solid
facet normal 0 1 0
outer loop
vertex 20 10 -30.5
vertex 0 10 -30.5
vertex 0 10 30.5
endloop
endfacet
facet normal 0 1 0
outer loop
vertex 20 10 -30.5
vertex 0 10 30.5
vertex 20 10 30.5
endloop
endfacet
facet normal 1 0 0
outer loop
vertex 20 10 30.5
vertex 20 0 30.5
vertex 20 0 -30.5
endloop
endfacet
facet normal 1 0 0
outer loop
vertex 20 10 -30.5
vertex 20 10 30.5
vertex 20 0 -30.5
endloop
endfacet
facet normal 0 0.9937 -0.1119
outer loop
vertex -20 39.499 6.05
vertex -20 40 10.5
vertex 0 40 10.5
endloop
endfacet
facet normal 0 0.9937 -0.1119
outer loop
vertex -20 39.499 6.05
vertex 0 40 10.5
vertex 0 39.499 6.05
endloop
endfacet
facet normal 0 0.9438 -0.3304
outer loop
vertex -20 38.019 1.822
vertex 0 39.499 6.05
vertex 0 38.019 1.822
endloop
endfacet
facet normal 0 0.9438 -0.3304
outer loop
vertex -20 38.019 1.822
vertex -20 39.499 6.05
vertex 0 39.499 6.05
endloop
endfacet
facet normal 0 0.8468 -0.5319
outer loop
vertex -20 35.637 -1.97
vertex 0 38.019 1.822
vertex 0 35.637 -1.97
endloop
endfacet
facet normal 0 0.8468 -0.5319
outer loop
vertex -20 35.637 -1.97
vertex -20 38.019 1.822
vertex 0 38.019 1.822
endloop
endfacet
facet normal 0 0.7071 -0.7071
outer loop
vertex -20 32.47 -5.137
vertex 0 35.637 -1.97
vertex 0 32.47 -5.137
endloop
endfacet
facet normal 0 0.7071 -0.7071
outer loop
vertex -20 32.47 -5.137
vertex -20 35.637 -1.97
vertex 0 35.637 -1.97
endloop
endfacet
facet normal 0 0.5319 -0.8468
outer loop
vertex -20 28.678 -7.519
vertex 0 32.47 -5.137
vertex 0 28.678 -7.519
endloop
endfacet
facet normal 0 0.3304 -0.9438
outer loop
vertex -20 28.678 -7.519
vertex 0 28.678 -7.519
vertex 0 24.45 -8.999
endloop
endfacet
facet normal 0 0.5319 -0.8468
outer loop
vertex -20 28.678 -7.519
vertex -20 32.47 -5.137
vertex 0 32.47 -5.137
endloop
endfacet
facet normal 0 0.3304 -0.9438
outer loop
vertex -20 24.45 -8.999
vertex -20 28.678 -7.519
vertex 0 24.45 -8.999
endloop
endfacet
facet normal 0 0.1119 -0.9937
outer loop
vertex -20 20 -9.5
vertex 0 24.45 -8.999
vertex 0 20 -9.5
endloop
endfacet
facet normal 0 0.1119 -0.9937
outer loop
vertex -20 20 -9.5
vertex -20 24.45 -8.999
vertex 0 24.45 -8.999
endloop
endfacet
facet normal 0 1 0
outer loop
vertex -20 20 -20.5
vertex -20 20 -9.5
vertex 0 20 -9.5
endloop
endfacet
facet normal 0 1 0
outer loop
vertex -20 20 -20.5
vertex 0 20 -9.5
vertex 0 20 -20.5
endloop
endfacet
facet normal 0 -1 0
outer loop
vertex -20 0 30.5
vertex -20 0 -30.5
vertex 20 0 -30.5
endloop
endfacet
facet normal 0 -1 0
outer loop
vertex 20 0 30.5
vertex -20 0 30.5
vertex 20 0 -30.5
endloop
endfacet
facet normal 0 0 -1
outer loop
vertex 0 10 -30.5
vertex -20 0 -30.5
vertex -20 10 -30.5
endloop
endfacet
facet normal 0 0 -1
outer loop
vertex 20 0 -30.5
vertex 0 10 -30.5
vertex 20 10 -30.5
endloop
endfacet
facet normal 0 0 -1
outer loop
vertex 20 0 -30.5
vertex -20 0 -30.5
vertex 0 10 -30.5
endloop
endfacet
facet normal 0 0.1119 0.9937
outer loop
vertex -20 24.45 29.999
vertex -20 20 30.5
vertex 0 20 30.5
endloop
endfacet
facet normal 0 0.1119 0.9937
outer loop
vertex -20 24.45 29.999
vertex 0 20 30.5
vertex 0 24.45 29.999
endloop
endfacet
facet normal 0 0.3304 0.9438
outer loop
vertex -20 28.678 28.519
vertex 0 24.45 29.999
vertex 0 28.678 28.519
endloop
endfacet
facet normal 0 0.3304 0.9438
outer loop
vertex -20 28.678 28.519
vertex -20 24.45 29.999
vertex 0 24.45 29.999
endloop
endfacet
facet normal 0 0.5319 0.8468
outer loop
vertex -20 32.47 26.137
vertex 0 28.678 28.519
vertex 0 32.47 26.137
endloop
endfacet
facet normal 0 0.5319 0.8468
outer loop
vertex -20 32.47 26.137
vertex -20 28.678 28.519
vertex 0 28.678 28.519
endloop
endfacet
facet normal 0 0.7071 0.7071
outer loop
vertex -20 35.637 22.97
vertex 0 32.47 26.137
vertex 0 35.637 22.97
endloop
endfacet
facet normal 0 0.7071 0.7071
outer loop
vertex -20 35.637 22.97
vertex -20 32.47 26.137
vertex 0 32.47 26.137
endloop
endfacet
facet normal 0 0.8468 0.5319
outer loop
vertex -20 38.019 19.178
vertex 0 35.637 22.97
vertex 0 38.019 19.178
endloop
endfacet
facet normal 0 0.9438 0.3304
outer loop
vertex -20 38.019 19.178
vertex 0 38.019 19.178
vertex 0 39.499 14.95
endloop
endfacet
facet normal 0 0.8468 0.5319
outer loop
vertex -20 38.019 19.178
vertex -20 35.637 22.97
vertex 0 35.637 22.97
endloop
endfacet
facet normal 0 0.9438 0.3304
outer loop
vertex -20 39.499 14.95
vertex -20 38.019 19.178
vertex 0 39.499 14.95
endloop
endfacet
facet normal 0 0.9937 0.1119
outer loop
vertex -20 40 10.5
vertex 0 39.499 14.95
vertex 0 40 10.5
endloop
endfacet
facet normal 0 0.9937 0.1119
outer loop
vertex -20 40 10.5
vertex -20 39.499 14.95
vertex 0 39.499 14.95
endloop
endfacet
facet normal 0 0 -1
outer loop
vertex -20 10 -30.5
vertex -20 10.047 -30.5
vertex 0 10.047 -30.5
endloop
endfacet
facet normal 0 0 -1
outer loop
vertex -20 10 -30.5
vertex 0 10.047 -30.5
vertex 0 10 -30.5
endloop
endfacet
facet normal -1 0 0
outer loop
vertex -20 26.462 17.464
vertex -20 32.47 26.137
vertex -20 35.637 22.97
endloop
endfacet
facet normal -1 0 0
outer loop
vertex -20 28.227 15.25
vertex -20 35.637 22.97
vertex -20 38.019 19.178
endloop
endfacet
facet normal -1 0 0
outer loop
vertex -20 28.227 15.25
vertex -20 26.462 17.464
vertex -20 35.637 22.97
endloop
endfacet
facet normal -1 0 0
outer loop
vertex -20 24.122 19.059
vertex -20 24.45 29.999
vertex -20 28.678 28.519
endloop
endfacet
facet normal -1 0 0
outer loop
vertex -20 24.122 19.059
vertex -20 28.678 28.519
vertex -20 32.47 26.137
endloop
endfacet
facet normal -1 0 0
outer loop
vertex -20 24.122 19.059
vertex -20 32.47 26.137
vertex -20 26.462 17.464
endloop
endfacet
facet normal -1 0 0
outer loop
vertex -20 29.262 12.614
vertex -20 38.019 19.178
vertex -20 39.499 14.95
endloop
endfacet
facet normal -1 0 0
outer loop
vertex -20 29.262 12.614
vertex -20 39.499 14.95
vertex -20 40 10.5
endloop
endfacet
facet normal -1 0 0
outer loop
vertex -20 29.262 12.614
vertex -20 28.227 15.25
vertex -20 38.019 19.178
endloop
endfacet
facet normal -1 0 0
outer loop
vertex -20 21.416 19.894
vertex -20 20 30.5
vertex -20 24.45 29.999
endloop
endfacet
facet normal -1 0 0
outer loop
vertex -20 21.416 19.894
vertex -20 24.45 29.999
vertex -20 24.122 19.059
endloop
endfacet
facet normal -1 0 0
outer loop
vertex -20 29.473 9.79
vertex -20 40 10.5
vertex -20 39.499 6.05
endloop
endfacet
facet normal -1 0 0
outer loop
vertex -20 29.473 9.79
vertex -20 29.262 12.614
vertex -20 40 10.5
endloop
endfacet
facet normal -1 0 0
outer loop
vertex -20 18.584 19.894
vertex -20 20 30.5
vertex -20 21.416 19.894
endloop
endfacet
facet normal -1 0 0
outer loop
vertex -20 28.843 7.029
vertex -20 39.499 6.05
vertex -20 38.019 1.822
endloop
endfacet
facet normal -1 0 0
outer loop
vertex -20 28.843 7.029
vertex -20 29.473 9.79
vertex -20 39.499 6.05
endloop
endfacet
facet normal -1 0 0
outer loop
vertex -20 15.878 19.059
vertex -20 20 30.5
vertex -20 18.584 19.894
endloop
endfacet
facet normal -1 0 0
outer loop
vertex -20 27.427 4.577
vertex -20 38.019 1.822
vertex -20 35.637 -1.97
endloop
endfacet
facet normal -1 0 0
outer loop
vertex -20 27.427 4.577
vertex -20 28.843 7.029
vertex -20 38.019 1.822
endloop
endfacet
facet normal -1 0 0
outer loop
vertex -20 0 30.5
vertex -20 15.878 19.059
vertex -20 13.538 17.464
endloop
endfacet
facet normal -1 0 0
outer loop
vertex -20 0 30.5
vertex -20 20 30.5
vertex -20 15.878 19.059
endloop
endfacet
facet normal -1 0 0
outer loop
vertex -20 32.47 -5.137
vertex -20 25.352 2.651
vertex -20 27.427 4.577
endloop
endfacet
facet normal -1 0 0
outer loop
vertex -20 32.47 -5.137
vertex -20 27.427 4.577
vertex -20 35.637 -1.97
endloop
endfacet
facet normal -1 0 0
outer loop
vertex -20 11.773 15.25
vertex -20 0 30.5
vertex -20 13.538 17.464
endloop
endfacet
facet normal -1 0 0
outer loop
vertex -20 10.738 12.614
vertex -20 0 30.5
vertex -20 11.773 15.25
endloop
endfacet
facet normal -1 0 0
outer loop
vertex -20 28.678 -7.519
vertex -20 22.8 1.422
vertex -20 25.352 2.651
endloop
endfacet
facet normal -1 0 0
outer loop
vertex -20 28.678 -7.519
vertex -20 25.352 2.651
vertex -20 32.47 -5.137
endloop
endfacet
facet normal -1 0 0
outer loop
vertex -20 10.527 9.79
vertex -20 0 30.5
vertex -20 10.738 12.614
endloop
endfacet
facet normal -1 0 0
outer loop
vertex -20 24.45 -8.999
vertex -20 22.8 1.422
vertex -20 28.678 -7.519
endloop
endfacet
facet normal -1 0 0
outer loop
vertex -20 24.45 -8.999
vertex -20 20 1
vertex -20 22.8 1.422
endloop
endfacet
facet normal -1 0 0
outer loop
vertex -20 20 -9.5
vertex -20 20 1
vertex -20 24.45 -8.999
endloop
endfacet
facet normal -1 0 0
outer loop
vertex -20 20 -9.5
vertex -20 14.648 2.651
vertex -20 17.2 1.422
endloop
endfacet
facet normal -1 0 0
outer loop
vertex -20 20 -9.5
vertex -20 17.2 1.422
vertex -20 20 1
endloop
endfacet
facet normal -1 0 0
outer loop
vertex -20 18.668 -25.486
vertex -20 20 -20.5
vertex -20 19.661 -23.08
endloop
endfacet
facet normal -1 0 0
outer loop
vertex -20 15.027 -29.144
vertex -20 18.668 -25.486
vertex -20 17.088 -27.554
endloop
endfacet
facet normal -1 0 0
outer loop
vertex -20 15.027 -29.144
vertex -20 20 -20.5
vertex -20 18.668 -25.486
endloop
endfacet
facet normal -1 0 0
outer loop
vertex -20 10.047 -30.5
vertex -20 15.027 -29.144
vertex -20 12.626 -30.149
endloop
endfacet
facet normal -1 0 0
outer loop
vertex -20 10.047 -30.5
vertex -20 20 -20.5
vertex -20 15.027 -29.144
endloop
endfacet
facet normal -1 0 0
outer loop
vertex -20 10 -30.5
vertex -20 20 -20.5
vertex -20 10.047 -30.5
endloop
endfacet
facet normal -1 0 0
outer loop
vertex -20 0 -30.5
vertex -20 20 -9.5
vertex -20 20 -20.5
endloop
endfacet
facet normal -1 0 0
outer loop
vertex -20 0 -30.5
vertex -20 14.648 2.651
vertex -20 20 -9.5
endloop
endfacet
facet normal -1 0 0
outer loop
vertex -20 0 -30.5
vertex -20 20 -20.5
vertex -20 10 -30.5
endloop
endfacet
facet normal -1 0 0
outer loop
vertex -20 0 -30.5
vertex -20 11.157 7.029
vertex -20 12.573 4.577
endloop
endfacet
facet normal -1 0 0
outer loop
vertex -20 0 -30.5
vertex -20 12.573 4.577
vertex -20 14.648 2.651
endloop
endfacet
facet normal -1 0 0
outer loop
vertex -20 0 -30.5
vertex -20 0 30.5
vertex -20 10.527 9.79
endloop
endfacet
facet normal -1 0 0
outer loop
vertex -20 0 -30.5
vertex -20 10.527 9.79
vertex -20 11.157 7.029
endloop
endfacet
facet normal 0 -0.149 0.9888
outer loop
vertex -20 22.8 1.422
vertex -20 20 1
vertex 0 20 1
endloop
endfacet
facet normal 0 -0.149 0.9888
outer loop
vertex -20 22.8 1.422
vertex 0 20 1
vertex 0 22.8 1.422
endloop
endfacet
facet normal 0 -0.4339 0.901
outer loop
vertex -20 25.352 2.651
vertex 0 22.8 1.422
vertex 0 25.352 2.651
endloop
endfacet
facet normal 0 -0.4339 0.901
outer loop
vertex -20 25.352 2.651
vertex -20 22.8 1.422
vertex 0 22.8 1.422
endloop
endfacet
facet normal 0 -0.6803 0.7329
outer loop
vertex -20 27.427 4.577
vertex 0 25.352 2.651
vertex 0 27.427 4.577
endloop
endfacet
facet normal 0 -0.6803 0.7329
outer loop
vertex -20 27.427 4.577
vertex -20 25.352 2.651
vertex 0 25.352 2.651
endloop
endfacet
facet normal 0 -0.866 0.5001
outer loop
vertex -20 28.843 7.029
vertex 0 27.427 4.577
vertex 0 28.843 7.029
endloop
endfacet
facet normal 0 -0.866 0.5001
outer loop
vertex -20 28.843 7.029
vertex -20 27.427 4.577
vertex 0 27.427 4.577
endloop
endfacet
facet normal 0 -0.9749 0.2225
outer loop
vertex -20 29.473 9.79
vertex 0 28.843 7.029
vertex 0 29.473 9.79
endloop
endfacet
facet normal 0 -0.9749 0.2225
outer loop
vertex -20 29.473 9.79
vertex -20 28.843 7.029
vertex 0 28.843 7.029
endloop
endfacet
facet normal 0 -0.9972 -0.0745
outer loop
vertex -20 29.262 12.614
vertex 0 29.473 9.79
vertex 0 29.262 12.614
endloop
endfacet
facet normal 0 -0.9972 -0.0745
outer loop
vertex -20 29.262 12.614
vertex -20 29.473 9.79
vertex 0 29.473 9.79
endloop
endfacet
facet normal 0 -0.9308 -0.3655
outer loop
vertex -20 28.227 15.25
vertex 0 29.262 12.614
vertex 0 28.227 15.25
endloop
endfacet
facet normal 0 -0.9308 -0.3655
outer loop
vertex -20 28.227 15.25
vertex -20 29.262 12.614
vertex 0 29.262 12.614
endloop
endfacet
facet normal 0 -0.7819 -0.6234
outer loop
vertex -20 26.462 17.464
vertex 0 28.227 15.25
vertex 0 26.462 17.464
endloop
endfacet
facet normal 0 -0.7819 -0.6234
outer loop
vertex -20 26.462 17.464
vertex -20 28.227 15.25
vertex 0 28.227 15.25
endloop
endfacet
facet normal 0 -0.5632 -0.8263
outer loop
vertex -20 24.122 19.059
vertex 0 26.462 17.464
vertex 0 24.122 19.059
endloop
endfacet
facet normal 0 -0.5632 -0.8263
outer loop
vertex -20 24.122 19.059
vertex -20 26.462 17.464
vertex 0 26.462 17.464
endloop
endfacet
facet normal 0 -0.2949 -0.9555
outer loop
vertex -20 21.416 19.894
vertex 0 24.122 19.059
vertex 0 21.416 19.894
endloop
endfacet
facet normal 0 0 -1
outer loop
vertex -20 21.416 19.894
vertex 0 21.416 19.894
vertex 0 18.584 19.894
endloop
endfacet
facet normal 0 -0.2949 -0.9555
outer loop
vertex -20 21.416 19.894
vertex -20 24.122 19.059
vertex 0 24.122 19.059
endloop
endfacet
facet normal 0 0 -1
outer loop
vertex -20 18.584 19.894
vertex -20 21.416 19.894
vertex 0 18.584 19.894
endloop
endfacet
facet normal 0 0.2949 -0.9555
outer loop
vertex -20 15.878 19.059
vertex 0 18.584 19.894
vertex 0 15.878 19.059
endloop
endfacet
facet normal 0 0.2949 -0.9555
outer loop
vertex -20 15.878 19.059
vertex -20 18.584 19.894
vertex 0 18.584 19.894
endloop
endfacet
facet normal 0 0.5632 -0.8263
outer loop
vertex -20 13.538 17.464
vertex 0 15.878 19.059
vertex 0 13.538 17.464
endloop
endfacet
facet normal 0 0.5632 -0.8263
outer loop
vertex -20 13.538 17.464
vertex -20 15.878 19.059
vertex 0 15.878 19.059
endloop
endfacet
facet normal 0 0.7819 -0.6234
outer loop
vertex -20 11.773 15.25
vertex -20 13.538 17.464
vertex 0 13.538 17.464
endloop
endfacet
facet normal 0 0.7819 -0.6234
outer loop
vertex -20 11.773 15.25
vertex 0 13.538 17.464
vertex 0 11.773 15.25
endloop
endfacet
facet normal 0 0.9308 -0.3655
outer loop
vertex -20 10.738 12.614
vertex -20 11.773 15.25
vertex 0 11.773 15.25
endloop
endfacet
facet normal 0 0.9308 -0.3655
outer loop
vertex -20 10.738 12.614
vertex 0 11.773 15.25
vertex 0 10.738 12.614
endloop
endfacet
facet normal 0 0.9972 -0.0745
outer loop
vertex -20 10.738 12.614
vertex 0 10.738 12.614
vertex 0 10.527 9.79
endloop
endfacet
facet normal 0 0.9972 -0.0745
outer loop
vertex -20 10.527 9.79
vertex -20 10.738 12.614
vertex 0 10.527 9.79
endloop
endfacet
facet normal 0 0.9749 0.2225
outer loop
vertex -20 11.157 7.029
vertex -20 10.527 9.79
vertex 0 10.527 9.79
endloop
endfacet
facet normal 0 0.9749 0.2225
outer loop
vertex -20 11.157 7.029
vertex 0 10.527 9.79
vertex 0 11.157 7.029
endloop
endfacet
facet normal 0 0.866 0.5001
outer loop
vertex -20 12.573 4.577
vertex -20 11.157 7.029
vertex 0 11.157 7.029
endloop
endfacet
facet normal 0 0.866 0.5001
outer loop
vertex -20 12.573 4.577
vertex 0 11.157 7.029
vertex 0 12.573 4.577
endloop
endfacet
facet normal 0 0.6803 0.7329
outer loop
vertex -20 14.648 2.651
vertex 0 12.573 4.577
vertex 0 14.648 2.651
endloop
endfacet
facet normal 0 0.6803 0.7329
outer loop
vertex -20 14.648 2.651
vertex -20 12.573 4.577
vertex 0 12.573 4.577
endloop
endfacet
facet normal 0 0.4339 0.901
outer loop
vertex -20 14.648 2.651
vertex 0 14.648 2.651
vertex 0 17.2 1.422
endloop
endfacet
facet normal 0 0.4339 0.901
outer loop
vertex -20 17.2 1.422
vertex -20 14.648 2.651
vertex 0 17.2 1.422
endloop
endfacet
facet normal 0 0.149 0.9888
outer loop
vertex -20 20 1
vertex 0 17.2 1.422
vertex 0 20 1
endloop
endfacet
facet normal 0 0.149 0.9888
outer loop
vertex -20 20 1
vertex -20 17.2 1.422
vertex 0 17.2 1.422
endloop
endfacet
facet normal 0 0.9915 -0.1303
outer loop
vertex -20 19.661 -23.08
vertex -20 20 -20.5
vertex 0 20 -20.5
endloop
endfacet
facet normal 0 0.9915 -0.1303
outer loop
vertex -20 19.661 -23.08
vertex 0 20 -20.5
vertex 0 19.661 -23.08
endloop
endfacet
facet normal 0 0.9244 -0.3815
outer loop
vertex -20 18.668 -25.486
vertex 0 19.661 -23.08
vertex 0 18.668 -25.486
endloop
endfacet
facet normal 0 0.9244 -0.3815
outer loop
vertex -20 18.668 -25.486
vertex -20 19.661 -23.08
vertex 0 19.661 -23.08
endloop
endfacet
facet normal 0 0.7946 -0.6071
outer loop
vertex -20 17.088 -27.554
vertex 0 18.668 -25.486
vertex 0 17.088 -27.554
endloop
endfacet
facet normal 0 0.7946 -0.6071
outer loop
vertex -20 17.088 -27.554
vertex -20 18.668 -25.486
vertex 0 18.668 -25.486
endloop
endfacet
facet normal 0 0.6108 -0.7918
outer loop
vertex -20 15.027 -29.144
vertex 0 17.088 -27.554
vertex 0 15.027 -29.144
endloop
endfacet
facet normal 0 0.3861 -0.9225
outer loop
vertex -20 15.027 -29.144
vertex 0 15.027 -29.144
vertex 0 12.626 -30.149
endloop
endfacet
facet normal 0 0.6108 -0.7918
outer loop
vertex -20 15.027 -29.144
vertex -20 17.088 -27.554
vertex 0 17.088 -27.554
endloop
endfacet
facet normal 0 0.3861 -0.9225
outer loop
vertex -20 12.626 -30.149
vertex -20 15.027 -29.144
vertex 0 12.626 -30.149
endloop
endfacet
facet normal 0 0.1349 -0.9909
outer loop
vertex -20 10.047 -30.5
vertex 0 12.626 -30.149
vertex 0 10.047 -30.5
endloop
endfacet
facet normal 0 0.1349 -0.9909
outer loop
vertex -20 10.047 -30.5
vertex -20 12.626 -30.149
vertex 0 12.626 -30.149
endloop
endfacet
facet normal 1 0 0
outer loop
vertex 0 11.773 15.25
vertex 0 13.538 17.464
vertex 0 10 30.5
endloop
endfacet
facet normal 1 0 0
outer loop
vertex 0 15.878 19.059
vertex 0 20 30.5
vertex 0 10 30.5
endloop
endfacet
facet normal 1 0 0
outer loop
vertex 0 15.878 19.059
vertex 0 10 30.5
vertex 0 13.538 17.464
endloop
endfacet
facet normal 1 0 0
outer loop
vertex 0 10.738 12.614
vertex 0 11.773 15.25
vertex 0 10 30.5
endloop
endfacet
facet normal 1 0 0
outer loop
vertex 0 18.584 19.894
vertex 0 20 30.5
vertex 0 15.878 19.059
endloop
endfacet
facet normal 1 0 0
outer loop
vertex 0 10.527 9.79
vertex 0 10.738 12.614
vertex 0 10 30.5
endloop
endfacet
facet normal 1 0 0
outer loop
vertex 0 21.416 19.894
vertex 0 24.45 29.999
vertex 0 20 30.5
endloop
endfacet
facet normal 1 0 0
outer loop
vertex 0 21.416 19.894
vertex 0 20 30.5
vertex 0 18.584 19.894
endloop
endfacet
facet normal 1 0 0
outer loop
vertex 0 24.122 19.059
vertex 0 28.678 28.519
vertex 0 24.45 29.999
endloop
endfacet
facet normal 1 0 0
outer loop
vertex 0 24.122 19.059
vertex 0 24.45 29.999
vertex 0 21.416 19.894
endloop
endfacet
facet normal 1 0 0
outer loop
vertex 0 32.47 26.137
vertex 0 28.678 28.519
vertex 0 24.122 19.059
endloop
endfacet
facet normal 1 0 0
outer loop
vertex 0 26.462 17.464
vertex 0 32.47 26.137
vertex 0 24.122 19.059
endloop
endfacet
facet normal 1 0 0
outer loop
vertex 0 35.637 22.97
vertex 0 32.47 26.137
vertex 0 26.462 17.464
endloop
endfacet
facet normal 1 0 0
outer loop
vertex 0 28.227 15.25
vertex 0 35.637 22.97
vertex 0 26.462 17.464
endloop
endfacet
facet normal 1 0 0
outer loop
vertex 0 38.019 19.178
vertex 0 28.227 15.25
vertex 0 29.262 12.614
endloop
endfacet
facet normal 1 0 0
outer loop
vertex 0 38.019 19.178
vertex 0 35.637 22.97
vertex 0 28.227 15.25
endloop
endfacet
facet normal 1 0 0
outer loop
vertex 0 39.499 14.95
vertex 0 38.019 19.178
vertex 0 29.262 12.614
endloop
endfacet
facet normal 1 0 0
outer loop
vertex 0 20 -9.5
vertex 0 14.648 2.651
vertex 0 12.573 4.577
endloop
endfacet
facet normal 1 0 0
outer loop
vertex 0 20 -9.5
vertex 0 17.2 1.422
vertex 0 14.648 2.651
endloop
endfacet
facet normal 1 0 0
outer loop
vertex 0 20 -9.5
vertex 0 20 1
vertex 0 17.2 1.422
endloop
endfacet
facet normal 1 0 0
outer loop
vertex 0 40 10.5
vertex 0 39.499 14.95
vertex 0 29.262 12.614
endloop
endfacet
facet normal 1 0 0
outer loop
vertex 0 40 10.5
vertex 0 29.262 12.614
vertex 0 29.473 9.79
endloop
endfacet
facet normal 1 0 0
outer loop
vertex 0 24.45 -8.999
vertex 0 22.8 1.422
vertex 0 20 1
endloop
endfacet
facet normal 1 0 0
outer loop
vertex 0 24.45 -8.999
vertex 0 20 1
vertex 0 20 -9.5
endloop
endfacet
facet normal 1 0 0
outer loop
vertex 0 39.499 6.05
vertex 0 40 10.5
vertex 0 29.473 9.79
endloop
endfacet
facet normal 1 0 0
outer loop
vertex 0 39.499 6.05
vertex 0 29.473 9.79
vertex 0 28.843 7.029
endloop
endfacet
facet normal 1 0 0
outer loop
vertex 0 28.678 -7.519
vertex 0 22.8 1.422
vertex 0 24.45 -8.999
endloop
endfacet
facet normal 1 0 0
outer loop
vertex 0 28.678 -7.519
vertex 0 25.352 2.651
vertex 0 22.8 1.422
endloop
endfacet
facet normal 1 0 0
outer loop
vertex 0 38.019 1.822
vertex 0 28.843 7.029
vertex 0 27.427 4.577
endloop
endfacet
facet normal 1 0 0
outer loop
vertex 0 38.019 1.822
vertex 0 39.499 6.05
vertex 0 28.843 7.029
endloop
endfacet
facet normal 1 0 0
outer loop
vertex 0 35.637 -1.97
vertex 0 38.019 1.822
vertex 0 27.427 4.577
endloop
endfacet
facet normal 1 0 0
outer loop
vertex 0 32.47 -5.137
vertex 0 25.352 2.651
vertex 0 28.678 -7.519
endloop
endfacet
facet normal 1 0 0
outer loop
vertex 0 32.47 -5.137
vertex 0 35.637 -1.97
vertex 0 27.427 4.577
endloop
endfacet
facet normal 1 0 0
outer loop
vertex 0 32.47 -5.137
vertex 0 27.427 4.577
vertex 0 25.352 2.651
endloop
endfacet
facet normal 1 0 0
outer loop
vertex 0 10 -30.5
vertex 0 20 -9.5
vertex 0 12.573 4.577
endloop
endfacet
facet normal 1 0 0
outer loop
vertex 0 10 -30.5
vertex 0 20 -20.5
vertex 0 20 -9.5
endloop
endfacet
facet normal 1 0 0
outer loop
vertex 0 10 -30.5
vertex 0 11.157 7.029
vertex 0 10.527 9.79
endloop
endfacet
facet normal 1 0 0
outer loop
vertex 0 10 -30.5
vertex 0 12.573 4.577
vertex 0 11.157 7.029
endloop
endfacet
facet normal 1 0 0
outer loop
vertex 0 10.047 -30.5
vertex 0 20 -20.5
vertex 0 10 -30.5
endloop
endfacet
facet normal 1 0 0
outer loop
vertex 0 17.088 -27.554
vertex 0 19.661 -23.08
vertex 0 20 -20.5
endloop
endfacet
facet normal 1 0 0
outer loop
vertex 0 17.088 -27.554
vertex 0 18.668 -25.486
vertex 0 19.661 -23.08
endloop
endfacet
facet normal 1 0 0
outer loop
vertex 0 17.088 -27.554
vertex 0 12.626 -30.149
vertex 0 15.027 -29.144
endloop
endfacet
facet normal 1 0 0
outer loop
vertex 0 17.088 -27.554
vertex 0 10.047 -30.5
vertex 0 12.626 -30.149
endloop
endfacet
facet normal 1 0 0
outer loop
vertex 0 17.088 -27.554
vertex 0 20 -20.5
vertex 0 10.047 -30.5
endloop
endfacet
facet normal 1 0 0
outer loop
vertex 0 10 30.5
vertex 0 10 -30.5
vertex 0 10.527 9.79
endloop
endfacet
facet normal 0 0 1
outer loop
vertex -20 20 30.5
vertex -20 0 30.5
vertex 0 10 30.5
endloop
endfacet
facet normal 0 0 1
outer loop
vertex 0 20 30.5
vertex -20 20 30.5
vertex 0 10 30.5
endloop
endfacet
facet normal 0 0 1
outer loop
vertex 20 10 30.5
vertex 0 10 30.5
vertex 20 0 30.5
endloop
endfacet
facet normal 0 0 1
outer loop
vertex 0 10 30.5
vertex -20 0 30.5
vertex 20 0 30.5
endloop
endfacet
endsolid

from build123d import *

# Parameters (mm, degrees)
SKETCH1_W           = 40
SKETCH1_H           = 61
BOSS_EXTRUDE1_DEPTH = 40
SKETCH2_W           = 20
SKETCH2_H           = 61
CUT_EXTRUDE1_DEPTH  = 30
SKETCH3_R           = 9.5
CUT_EXTRUDE3_DEPTH  = 55.13178364


with BuildPart() as part:
    # Sketch1 → Boss-Extrude1 (new body)
    with BuildSketch(Plane(origin=(0, 0, 0), x_dir=(1, 0, 0), z_dir=(0, 1, 0))):
        Rectangle(SKETCH1_W, SKETCH1_H)
    extrude(amount=BOSS_EXTRUDE1_DEPTH)

    # Sketch2 → Cut-Extrude1 (cut)
    with BuildSketch(Plane(origin=(0, 40, 0), x_dir=(1, 0, 0), z_dir=(0, 1, 0))):
        with Locations((10, 0)):
            Rectangle(SKETCH2_W, SKETCH2_H)
    extrude(amount=-CUT_EXTRUDE1_DEPTH, mode=Mode.SUBTRACT)

    # Sketch3 → Cut-Extrude3 (cut, through all)
    with BuildSketch(Plane(origin=(0, 0, 0), x_dir=(0, 0, -1), z_dir=(1, 0, 0))):
        with Locations((-10.5, 20)):
            Circle(SKETCH3_R)
        with BuildLine():
            Line((30.5, 40), (-10.5, 40))
            ThreePointArc((-10.5, 40), (3.642135624, 34.142135624), (9.5, 20))
            Line((9.5, 20), (20.499888339, 20))
            ThreePointArc((20.499888339, 20), (27.554228667, 17.087755818), (30.49977668, 10.047256507))
            Line((30.49977668, 10.047256507), (30.5, 10))
            Line((30.5, 10), (30.5, 40))
        make_face()
        with BuildLine():
            Line((-30.5, 40), (-30.5, 20))
            ThreePointArc((-30.5, 20), (-24.642135624, 34.142135624), (-10.5, 40))
            Line((-10.5, 40), (-30.5, 40))
        make_face()
    extrude(amount=-CUT_EXTRUDE3_DEPTH, mode=Mode.SUBTRACT)


solid = part.part
